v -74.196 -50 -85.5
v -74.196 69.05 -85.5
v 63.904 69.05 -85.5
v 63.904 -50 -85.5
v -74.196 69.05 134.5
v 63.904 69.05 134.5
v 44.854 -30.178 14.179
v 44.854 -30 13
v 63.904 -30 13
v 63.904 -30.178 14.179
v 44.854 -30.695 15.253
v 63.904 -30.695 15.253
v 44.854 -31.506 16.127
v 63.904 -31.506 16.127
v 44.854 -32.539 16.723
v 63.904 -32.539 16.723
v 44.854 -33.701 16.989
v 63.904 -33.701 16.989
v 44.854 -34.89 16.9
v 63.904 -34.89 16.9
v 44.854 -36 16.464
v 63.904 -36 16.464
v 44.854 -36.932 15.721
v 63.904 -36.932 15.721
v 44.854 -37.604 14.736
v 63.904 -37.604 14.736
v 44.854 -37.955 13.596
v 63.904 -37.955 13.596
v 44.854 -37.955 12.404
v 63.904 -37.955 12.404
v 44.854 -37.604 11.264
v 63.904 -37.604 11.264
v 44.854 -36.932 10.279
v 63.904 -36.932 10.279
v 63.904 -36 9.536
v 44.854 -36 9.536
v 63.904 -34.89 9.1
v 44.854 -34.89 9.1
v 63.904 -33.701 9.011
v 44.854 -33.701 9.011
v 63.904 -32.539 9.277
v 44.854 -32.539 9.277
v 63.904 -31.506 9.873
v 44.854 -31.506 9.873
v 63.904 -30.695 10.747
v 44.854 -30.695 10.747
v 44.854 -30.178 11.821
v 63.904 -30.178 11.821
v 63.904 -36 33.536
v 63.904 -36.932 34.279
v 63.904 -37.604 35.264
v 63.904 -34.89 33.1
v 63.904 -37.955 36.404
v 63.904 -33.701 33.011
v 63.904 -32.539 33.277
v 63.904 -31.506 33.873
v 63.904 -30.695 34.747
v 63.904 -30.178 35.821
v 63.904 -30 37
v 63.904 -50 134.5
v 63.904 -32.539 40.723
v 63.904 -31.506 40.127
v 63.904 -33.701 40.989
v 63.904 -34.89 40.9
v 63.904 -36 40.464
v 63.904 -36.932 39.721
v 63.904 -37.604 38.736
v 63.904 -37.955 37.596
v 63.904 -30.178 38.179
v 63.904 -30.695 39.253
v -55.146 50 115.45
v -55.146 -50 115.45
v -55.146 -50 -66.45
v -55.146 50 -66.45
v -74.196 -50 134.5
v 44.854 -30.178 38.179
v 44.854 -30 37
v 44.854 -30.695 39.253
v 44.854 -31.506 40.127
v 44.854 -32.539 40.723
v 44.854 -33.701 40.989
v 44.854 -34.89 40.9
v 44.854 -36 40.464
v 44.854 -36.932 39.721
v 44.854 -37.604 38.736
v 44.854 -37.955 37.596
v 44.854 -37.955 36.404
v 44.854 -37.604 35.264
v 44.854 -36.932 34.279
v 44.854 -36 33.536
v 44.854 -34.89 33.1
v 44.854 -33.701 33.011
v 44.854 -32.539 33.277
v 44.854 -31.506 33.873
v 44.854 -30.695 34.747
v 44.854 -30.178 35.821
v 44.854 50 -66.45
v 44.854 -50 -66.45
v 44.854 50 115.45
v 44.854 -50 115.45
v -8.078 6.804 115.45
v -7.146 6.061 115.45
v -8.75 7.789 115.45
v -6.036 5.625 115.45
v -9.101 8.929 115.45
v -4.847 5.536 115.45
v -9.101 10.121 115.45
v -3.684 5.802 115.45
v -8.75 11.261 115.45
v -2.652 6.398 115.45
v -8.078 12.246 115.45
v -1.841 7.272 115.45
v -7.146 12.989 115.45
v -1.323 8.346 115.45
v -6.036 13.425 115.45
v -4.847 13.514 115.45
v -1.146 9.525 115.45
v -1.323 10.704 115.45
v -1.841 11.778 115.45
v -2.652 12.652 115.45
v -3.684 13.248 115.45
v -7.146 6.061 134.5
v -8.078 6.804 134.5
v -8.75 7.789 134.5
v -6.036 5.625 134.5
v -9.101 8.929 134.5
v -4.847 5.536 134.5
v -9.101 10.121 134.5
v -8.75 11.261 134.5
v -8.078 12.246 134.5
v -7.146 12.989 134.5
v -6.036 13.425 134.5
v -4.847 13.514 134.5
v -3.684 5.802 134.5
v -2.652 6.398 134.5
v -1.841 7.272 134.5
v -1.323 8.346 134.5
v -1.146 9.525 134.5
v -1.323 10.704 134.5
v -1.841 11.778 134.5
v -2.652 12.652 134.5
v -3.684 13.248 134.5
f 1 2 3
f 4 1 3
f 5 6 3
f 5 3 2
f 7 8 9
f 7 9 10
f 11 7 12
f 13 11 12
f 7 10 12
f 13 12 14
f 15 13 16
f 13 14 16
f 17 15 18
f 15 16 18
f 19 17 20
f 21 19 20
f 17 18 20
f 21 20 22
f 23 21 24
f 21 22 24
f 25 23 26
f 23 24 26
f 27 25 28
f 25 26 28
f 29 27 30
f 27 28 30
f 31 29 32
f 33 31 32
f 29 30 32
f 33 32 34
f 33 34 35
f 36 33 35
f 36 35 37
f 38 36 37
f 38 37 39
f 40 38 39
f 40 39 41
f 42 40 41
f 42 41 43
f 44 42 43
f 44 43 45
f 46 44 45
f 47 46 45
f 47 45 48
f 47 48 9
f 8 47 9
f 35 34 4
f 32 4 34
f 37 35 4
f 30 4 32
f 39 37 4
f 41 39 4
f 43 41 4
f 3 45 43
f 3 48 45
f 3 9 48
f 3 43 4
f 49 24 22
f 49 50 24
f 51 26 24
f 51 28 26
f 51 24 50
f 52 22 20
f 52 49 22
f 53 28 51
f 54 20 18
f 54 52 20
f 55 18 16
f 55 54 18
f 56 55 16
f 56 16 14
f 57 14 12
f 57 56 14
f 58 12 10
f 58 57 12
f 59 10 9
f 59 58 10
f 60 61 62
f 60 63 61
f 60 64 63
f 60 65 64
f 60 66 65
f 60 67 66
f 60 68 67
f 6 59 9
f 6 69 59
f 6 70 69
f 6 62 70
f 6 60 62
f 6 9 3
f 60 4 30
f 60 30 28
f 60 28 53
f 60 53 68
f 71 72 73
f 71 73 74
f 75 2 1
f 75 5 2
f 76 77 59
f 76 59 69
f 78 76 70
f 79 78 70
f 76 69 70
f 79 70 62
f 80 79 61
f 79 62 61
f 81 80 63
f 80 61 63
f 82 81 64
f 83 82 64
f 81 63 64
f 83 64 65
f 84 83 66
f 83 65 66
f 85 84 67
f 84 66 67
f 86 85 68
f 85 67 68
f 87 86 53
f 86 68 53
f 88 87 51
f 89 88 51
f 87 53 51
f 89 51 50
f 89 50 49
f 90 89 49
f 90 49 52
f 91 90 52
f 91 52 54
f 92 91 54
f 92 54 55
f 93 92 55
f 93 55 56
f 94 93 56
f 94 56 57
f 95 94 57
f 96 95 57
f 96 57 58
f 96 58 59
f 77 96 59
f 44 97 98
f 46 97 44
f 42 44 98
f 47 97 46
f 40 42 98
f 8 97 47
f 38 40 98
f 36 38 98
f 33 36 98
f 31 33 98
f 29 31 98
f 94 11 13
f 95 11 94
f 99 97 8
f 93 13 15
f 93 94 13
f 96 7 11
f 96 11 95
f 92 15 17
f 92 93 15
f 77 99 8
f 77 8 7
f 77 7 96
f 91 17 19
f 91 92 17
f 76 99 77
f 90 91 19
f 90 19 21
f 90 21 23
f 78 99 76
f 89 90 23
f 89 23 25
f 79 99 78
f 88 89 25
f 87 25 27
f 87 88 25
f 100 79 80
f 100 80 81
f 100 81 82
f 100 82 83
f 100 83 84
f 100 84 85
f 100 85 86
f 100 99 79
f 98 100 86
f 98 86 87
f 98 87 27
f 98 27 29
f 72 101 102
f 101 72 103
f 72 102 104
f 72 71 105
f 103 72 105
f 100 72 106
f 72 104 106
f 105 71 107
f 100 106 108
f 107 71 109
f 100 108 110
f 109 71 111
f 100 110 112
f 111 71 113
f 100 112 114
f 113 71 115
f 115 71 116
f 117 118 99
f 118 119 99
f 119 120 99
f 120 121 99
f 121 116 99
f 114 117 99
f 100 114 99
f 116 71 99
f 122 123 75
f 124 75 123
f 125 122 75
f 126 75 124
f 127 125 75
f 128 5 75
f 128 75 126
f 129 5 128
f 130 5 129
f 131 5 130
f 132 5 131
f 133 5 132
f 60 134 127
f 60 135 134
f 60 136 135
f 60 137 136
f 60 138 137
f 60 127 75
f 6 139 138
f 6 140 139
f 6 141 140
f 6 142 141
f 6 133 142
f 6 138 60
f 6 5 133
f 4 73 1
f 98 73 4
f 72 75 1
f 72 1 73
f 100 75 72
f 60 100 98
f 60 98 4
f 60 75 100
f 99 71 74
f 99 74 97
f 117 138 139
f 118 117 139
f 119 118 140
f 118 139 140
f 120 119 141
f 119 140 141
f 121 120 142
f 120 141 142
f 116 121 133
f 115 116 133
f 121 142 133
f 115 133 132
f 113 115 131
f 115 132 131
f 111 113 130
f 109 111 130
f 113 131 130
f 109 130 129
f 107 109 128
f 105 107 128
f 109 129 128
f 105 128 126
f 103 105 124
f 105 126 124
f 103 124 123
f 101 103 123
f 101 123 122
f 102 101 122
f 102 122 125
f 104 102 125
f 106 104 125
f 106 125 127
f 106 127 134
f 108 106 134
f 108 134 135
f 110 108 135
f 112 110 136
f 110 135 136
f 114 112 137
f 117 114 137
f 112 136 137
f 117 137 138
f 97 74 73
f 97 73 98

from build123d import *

# Parameters (mm, degrees)
F2_DEPTH      = 140
F2_DEPTH_BACK = 80
F3_W          = 100
F3_H          = 19.05
F4_DEPTH      = 100
F5_R          = 4
F6_DEPTH      = 19.05
F7_R          = 4
F8_DEPTH      = 20


with BuildPart() as f2:
    # F1 (on offset) → F2 (new body, two sides)
    with BuildSketch(Plane.XY.offset(-5.5)) as f2_sk:
        Polygon((-55.145783, -50), (-55.145783, 50), (44.854217, 50), (44.854217, -50), (63.904217, -50), (63.904217, 69.05), (-74.195783, 69.05), (-74.195783, -50), align=None)
    extrude(amount=F2_DEPTH)
    extrude(f2_sk.sketch, amount=-F2_DEPTH_BACK)

    # F3 (on face) → F4 (join)
    with BuildSketch(Plane.XZ.offset(-50)):
        with Locations((-5.145783, 124.975)):
            Rectangle(F3_W, F3_H)
        with Locations((-5.145783, -75.975)):
            Rectangle(F3_W, F3_H)
    extrude(amount=F4_DEPTH)

    # F5 (on face) → F6 (cut)
    with BuildSketch(Plane.XY.offset(134.5)):
        with Locations((-5.145783, 9.525)):
            Circle(F5_R)
    extrude(amount=-F6_DEPTH, mode=Mode.SUBTRACT)

    # F7 (on face) → F8 (cut)
    with BuildSketch(Plane.YZ.offset(63.904217)):
        with Locations((-34, 13)):
            Circle(F7_R)
        with Locations((-34, 37)):
            Circle(F7_R)
    extrude(amount=-F8_DEPTH, mode=Mode.SUBTRACT)


solid = f2.part
